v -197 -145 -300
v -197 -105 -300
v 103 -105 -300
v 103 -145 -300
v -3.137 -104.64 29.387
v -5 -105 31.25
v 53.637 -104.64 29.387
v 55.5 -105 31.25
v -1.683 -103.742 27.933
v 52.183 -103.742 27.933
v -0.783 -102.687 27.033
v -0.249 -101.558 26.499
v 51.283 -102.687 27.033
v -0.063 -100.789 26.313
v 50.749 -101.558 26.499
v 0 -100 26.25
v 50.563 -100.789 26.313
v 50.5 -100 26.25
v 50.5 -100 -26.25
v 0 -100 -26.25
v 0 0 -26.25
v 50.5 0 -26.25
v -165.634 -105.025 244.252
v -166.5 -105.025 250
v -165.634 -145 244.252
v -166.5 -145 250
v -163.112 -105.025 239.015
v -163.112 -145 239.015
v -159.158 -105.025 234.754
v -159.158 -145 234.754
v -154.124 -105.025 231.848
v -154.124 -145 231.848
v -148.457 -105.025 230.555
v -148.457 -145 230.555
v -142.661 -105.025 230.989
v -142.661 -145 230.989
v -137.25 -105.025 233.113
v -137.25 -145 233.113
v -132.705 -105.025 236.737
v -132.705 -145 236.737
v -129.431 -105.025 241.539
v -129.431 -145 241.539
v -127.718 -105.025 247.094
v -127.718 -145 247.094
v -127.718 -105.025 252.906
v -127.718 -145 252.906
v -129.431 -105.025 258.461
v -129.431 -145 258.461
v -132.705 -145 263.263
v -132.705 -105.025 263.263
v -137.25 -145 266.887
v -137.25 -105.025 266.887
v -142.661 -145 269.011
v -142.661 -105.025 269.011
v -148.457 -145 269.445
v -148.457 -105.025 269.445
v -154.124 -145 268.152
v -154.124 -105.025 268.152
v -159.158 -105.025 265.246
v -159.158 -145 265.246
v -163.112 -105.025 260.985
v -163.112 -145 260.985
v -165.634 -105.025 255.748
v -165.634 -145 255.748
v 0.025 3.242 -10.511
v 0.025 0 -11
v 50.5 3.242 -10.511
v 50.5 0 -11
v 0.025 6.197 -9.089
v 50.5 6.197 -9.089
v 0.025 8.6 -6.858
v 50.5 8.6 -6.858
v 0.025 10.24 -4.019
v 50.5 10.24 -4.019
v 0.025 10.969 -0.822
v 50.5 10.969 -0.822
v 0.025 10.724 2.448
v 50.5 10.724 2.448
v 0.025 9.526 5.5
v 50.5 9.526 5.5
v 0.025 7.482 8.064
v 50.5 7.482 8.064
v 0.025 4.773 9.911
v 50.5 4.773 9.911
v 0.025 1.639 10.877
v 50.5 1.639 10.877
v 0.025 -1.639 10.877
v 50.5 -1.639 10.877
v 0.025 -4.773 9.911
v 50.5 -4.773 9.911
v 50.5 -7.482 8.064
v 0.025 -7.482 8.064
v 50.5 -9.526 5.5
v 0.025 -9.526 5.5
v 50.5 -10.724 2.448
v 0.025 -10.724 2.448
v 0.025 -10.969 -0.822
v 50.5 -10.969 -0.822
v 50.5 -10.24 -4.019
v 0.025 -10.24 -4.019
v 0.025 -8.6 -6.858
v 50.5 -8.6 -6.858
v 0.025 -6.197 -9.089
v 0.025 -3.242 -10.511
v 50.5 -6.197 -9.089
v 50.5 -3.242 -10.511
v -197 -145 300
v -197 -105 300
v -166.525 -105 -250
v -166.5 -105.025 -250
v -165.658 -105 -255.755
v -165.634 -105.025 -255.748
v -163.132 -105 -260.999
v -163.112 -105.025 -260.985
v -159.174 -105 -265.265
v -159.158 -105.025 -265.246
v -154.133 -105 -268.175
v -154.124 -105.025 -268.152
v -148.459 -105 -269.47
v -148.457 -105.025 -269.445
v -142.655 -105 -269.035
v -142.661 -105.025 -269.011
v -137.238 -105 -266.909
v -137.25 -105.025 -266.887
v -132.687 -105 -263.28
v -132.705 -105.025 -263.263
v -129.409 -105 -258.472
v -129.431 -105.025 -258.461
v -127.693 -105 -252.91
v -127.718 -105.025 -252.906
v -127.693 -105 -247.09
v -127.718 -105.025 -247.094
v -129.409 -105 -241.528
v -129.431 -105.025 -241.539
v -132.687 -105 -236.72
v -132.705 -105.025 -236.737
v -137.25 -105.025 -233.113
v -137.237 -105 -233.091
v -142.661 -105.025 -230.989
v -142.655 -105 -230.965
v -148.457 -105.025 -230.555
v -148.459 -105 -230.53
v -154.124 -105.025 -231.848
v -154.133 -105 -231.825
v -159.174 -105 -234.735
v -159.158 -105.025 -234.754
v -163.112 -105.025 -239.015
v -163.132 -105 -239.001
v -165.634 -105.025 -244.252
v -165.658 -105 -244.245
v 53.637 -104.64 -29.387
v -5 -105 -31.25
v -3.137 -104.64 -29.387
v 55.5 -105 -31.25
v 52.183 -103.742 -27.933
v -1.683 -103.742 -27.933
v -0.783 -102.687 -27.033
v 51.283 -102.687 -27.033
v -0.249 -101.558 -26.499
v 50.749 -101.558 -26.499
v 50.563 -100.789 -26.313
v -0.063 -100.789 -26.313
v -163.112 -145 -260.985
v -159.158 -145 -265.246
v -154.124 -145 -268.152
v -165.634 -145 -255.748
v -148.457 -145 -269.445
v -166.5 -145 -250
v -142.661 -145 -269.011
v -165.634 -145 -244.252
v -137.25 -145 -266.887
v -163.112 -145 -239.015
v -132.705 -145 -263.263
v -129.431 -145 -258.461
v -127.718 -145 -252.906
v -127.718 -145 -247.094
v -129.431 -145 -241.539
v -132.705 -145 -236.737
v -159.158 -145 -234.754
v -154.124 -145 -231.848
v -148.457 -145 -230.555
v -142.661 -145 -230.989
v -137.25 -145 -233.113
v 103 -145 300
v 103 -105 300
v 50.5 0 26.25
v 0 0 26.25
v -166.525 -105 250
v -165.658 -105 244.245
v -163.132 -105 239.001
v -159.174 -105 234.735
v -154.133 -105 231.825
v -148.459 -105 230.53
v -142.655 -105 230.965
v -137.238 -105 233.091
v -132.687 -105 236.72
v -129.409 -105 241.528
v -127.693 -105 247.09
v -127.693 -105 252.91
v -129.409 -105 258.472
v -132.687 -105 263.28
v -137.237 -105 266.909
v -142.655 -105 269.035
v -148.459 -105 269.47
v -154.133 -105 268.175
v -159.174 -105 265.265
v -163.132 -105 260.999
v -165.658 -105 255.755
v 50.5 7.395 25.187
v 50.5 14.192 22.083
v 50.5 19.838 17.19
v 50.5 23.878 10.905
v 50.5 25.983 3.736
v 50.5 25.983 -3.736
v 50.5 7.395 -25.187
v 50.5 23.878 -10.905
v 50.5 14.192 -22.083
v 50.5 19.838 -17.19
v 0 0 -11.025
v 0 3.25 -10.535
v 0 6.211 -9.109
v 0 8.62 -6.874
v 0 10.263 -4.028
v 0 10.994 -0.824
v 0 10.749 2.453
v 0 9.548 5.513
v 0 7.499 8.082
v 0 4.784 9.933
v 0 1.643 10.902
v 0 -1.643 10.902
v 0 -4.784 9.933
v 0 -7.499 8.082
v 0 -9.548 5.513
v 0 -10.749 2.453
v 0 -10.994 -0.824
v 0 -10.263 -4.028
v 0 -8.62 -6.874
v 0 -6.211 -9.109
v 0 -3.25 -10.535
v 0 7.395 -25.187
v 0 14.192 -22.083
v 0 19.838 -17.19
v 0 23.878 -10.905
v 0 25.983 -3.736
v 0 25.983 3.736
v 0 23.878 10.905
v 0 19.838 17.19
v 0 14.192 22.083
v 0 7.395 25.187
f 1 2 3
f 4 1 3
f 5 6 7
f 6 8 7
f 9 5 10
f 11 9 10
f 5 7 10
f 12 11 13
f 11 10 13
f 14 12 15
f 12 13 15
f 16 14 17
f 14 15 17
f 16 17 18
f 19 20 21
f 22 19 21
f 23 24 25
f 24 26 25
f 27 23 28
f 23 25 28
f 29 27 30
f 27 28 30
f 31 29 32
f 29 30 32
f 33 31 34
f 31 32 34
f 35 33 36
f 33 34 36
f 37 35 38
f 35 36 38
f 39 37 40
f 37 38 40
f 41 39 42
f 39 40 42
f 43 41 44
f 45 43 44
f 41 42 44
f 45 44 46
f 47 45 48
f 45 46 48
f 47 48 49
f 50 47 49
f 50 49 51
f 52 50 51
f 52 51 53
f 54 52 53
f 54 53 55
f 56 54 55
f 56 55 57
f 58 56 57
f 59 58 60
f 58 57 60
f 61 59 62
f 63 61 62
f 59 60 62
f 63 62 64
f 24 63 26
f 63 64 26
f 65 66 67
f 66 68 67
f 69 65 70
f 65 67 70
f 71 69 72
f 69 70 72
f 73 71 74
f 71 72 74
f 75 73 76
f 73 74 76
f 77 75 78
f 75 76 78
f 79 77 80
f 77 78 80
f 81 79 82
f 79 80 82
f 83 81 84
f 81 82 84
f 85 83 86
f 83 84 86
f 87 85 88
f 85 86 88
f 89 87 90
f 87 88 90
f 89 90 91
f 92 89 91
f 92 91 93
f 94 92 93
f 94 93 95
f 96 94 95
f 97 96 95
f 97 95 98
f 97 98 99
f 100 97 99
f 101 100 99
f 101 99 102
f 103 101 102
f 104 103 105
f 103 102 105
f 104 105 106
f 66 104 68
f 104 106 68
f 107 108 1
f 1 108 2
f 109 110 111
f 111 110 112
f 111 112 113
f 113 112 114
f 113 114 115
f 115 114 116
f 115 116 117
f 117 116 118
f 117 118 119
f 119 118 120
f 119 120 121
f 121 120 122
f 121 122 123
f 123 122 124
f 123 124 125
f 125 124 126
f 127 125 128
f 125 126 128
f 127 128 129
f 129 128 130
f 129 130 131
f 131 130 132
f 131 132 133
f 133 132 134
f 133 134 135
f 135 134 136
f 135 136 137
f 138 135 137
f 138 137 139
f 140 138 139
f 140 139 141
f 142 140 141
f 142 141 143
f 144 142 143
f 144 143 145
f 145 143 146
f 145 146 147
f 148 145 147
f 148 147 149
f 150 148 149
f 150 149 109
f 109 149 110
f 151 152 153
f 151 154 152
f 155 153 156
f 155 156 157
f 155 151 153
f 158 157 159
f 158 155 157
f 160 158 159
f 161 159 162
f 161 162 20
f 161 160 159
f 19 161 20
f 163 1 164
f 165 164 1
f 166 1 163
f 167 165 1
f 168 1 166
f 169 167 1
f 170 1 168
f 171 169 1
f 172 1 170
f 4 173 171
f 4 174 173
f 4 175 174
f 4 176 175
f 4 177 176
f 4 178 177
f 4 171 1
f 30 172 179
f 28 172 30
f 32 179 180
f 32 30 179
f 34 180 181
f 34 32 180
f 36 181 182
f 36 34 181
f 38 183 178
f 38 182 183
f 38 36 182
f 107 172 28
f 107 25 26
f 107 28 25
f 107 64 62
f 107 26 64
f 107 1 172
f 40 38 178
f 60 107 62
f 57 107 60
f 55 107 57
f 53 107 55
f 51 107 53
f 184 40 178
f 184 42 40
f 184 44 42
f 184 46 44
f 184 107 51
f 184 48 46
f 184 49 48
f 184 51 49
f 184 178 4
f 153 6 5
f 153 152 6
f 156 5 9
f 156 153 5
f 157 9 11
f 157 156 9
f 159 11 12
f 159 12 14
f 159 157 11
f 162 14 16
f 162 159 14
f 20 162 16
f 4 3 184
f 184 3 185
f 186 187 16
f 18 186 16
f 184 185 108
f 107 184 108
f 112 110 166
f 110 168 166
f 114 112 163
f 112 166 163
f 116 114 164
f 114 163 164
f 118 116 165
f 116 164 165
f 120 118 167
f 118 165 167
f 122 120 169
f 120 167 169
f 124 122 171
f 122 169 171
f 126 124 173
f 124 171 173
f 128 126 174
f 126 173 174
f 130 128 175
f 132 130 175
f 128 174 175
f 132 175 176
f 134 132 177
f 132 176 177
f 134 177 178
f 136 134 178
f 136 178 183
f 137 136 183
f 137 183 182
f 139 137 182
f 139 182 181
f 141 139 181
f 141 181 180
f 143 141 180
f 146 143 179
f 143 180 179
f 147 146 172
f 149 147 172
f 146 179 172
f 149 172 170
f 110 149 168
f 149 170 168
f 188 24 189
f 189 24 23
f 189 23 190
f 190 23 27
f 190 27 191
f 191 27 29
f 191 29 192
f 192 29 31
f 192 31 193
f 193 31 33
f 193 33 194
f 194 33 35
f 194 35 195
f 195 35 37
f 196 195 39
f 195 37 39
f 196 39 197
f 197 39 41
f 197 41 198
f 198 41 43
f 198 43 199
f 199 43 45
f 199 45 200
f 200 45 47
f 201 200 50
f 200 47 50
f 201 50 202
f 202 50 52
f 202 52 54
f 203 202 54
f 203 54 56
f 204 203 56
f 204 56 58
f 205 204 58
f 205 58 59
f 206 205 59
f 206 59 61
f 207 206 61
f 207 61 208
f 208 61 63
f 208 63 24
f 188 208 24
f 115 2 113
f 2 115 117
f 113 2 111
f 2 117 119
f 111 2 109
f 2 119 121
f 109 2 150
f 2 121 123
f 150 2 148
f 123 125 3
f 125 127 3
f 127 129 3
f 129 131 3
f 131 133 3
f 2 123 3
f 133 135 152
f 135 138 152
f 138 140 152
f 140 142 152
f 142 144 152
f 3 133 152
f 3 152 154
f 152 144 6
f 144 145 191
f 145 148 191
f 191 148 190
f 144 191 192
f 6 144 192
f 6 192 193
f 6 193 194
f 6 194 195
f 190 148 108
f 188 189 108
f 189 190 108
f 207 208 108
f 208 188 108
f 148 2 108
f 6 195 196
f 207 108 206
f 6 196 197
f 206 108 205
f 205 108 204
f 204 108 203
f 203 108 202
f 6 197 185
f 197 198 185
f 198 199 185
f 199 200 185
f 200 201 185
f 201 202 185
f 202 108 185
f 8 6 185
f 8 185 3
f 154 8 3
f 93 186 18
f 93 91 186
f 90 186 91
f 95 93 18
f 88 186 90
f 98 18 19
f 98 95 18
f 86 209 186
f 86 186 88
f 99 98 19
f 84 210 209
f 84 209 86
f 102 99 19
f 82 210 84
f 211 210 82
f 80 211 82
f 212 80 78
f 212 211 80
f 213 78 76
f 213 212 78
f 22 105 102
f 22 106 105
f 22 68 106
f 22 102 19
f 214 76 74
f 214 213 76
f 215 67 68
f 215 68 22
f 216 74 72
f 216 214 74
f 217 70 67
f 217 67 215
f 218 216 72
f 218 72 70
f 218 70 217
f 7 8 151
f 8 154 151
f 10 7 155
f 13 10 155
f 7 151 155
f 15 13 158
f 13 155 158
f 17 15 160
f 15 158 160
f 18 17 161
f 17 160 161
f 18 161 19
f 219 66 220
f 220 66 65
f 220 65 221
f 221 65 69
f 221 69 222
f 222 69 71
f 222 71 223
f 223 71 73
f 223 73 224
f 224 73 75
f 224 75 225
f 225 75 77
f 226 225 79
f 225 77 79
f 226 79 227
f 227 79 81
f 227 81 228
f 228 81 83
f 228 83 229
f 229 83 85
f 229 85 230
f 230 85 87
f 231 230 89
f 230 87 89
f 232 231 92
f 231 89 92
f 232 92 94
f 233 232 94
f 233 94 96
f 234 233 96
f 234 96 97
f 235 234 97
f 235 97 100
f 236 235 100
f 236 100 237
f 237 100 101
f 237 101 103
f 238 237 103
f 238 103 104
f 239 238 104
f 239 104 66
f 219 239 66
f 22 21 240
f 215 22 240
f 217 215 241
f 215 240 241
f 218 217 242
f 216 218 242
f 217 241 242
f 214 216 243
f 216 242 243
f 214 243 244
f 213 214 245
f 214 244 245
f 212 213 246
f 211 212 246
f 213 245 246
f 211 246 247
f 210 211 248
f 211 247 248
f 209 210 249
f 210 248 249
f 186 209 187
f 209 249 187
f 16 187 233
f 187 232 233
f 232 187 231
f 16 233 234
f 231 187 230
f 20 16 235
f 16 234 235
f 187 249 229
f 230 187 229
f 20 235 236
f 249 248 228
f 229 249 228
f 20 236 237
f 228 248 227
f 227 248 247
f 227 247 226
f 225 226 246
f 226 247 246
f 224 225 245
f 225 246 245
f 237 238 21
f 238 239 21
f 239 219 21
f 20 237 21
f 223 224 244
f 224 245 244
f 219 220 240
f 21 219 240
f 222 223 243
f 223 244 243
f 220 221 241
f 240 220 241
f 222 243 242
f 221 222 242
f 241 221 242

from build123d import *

# Parameters (mm, degrees)
BOSS_EXTRUDE1_DEPTH                    = 50.5
TAP_DRILL_FOR_M24X2_0_TAP1_D           = 22
TAP_DRILL_FOR_M24X2_0_TAP1_CSINK_D     = 22.05
TAP_DRILL_FOR_M24X2_0_TAP1_CSINK_ANGLE = 90
BOSS_EXTRUDE2_DEPTH                    = 40
FILLET1_R                              = 5
TAP_DRILL_FOR_M42X3_0_TAP1_D           = 39
TAP_DRILL_FOR_M42X3_0_TAP1_CSINK_D     = 39.05
TAP_DRILL_FOR_M42X3_0_TAP1_CSINK_ANGLE = 90


with BuildPart() as part:
    # Sketch1 → Boss-Extrude1 (new body)
    with BuildSketch(Plane(origin=(0, 0, 0), x_dir=(0, 0, -1), z_dir=(1, 0, 0))):
        with BuildLine():
            Line((-26.25, 0), (-26.25, -105))
            Line((-26.25, -105), (26.25, -105))
            Line((26.25, -105), (26.25, 0))
            ThreePointArc((26.25, 0), (0, 26.25), (-26.25, 0))
        make_face()
    extrude(amount=BOSS_EXTRUDE1_DEPTH)

    # Tap Drill for M24x2.0 Tap1 (through all)
    with Locations(Plane.ZY):
        with Locations((0, 0)):
            CounterSinkHole(TAP_DRILL_FOR_M24X2_0_TAP1_D / 2, TAP_DRILL_FOR_M24X2_0_TAP1_CSINK_D / 2, counter_sink_angle=TAP_DRILL_FOR_M24X2_0_TAP1_CSINK_ANGLE)

    # Sketch6 → Boss-Extrude2 (add)
    with BuildSketch(Plane.XZ.offset(105)):
        Polygon((103, 0), (103, 300), (-197, 300), (-197, -300), (103, -300), align=None)
    extrude(amount=BOSS_EXTRUDE2_DEPTH)

    # Fillet1
    fillet1_edges = [part.edges().sort_by_distance(p)[0] for p in [
        (50.5, -105, 0),
        (0, -105, 0),
        (25.25, -105, -26.25),
        (25.25, -105, 26.25),
    ]]
    fillet(fillet1_edges, radius=FILLET1_R)

    # Tap Drill for M42x3.0 Tap1 (through all)
    with Locations(Plane(origin=(0, -105, 0), x_dir=(1, 0, 0), z_dir=(0, 1, 0))):
        with Locations((-147, 250), (-147, -250)):
            CounterSinkHole(TAP_DRILL_FOR_M42X3_0_TAP1_D / 2, TAP_DRILL_FOR_M42X3_0_TAP1_CSINK_D / 2, counter_sink_angle=TAP_DRILL_FOR_M42X3_0_TAP1_CSINK_ANGLE)


solid = part.part
